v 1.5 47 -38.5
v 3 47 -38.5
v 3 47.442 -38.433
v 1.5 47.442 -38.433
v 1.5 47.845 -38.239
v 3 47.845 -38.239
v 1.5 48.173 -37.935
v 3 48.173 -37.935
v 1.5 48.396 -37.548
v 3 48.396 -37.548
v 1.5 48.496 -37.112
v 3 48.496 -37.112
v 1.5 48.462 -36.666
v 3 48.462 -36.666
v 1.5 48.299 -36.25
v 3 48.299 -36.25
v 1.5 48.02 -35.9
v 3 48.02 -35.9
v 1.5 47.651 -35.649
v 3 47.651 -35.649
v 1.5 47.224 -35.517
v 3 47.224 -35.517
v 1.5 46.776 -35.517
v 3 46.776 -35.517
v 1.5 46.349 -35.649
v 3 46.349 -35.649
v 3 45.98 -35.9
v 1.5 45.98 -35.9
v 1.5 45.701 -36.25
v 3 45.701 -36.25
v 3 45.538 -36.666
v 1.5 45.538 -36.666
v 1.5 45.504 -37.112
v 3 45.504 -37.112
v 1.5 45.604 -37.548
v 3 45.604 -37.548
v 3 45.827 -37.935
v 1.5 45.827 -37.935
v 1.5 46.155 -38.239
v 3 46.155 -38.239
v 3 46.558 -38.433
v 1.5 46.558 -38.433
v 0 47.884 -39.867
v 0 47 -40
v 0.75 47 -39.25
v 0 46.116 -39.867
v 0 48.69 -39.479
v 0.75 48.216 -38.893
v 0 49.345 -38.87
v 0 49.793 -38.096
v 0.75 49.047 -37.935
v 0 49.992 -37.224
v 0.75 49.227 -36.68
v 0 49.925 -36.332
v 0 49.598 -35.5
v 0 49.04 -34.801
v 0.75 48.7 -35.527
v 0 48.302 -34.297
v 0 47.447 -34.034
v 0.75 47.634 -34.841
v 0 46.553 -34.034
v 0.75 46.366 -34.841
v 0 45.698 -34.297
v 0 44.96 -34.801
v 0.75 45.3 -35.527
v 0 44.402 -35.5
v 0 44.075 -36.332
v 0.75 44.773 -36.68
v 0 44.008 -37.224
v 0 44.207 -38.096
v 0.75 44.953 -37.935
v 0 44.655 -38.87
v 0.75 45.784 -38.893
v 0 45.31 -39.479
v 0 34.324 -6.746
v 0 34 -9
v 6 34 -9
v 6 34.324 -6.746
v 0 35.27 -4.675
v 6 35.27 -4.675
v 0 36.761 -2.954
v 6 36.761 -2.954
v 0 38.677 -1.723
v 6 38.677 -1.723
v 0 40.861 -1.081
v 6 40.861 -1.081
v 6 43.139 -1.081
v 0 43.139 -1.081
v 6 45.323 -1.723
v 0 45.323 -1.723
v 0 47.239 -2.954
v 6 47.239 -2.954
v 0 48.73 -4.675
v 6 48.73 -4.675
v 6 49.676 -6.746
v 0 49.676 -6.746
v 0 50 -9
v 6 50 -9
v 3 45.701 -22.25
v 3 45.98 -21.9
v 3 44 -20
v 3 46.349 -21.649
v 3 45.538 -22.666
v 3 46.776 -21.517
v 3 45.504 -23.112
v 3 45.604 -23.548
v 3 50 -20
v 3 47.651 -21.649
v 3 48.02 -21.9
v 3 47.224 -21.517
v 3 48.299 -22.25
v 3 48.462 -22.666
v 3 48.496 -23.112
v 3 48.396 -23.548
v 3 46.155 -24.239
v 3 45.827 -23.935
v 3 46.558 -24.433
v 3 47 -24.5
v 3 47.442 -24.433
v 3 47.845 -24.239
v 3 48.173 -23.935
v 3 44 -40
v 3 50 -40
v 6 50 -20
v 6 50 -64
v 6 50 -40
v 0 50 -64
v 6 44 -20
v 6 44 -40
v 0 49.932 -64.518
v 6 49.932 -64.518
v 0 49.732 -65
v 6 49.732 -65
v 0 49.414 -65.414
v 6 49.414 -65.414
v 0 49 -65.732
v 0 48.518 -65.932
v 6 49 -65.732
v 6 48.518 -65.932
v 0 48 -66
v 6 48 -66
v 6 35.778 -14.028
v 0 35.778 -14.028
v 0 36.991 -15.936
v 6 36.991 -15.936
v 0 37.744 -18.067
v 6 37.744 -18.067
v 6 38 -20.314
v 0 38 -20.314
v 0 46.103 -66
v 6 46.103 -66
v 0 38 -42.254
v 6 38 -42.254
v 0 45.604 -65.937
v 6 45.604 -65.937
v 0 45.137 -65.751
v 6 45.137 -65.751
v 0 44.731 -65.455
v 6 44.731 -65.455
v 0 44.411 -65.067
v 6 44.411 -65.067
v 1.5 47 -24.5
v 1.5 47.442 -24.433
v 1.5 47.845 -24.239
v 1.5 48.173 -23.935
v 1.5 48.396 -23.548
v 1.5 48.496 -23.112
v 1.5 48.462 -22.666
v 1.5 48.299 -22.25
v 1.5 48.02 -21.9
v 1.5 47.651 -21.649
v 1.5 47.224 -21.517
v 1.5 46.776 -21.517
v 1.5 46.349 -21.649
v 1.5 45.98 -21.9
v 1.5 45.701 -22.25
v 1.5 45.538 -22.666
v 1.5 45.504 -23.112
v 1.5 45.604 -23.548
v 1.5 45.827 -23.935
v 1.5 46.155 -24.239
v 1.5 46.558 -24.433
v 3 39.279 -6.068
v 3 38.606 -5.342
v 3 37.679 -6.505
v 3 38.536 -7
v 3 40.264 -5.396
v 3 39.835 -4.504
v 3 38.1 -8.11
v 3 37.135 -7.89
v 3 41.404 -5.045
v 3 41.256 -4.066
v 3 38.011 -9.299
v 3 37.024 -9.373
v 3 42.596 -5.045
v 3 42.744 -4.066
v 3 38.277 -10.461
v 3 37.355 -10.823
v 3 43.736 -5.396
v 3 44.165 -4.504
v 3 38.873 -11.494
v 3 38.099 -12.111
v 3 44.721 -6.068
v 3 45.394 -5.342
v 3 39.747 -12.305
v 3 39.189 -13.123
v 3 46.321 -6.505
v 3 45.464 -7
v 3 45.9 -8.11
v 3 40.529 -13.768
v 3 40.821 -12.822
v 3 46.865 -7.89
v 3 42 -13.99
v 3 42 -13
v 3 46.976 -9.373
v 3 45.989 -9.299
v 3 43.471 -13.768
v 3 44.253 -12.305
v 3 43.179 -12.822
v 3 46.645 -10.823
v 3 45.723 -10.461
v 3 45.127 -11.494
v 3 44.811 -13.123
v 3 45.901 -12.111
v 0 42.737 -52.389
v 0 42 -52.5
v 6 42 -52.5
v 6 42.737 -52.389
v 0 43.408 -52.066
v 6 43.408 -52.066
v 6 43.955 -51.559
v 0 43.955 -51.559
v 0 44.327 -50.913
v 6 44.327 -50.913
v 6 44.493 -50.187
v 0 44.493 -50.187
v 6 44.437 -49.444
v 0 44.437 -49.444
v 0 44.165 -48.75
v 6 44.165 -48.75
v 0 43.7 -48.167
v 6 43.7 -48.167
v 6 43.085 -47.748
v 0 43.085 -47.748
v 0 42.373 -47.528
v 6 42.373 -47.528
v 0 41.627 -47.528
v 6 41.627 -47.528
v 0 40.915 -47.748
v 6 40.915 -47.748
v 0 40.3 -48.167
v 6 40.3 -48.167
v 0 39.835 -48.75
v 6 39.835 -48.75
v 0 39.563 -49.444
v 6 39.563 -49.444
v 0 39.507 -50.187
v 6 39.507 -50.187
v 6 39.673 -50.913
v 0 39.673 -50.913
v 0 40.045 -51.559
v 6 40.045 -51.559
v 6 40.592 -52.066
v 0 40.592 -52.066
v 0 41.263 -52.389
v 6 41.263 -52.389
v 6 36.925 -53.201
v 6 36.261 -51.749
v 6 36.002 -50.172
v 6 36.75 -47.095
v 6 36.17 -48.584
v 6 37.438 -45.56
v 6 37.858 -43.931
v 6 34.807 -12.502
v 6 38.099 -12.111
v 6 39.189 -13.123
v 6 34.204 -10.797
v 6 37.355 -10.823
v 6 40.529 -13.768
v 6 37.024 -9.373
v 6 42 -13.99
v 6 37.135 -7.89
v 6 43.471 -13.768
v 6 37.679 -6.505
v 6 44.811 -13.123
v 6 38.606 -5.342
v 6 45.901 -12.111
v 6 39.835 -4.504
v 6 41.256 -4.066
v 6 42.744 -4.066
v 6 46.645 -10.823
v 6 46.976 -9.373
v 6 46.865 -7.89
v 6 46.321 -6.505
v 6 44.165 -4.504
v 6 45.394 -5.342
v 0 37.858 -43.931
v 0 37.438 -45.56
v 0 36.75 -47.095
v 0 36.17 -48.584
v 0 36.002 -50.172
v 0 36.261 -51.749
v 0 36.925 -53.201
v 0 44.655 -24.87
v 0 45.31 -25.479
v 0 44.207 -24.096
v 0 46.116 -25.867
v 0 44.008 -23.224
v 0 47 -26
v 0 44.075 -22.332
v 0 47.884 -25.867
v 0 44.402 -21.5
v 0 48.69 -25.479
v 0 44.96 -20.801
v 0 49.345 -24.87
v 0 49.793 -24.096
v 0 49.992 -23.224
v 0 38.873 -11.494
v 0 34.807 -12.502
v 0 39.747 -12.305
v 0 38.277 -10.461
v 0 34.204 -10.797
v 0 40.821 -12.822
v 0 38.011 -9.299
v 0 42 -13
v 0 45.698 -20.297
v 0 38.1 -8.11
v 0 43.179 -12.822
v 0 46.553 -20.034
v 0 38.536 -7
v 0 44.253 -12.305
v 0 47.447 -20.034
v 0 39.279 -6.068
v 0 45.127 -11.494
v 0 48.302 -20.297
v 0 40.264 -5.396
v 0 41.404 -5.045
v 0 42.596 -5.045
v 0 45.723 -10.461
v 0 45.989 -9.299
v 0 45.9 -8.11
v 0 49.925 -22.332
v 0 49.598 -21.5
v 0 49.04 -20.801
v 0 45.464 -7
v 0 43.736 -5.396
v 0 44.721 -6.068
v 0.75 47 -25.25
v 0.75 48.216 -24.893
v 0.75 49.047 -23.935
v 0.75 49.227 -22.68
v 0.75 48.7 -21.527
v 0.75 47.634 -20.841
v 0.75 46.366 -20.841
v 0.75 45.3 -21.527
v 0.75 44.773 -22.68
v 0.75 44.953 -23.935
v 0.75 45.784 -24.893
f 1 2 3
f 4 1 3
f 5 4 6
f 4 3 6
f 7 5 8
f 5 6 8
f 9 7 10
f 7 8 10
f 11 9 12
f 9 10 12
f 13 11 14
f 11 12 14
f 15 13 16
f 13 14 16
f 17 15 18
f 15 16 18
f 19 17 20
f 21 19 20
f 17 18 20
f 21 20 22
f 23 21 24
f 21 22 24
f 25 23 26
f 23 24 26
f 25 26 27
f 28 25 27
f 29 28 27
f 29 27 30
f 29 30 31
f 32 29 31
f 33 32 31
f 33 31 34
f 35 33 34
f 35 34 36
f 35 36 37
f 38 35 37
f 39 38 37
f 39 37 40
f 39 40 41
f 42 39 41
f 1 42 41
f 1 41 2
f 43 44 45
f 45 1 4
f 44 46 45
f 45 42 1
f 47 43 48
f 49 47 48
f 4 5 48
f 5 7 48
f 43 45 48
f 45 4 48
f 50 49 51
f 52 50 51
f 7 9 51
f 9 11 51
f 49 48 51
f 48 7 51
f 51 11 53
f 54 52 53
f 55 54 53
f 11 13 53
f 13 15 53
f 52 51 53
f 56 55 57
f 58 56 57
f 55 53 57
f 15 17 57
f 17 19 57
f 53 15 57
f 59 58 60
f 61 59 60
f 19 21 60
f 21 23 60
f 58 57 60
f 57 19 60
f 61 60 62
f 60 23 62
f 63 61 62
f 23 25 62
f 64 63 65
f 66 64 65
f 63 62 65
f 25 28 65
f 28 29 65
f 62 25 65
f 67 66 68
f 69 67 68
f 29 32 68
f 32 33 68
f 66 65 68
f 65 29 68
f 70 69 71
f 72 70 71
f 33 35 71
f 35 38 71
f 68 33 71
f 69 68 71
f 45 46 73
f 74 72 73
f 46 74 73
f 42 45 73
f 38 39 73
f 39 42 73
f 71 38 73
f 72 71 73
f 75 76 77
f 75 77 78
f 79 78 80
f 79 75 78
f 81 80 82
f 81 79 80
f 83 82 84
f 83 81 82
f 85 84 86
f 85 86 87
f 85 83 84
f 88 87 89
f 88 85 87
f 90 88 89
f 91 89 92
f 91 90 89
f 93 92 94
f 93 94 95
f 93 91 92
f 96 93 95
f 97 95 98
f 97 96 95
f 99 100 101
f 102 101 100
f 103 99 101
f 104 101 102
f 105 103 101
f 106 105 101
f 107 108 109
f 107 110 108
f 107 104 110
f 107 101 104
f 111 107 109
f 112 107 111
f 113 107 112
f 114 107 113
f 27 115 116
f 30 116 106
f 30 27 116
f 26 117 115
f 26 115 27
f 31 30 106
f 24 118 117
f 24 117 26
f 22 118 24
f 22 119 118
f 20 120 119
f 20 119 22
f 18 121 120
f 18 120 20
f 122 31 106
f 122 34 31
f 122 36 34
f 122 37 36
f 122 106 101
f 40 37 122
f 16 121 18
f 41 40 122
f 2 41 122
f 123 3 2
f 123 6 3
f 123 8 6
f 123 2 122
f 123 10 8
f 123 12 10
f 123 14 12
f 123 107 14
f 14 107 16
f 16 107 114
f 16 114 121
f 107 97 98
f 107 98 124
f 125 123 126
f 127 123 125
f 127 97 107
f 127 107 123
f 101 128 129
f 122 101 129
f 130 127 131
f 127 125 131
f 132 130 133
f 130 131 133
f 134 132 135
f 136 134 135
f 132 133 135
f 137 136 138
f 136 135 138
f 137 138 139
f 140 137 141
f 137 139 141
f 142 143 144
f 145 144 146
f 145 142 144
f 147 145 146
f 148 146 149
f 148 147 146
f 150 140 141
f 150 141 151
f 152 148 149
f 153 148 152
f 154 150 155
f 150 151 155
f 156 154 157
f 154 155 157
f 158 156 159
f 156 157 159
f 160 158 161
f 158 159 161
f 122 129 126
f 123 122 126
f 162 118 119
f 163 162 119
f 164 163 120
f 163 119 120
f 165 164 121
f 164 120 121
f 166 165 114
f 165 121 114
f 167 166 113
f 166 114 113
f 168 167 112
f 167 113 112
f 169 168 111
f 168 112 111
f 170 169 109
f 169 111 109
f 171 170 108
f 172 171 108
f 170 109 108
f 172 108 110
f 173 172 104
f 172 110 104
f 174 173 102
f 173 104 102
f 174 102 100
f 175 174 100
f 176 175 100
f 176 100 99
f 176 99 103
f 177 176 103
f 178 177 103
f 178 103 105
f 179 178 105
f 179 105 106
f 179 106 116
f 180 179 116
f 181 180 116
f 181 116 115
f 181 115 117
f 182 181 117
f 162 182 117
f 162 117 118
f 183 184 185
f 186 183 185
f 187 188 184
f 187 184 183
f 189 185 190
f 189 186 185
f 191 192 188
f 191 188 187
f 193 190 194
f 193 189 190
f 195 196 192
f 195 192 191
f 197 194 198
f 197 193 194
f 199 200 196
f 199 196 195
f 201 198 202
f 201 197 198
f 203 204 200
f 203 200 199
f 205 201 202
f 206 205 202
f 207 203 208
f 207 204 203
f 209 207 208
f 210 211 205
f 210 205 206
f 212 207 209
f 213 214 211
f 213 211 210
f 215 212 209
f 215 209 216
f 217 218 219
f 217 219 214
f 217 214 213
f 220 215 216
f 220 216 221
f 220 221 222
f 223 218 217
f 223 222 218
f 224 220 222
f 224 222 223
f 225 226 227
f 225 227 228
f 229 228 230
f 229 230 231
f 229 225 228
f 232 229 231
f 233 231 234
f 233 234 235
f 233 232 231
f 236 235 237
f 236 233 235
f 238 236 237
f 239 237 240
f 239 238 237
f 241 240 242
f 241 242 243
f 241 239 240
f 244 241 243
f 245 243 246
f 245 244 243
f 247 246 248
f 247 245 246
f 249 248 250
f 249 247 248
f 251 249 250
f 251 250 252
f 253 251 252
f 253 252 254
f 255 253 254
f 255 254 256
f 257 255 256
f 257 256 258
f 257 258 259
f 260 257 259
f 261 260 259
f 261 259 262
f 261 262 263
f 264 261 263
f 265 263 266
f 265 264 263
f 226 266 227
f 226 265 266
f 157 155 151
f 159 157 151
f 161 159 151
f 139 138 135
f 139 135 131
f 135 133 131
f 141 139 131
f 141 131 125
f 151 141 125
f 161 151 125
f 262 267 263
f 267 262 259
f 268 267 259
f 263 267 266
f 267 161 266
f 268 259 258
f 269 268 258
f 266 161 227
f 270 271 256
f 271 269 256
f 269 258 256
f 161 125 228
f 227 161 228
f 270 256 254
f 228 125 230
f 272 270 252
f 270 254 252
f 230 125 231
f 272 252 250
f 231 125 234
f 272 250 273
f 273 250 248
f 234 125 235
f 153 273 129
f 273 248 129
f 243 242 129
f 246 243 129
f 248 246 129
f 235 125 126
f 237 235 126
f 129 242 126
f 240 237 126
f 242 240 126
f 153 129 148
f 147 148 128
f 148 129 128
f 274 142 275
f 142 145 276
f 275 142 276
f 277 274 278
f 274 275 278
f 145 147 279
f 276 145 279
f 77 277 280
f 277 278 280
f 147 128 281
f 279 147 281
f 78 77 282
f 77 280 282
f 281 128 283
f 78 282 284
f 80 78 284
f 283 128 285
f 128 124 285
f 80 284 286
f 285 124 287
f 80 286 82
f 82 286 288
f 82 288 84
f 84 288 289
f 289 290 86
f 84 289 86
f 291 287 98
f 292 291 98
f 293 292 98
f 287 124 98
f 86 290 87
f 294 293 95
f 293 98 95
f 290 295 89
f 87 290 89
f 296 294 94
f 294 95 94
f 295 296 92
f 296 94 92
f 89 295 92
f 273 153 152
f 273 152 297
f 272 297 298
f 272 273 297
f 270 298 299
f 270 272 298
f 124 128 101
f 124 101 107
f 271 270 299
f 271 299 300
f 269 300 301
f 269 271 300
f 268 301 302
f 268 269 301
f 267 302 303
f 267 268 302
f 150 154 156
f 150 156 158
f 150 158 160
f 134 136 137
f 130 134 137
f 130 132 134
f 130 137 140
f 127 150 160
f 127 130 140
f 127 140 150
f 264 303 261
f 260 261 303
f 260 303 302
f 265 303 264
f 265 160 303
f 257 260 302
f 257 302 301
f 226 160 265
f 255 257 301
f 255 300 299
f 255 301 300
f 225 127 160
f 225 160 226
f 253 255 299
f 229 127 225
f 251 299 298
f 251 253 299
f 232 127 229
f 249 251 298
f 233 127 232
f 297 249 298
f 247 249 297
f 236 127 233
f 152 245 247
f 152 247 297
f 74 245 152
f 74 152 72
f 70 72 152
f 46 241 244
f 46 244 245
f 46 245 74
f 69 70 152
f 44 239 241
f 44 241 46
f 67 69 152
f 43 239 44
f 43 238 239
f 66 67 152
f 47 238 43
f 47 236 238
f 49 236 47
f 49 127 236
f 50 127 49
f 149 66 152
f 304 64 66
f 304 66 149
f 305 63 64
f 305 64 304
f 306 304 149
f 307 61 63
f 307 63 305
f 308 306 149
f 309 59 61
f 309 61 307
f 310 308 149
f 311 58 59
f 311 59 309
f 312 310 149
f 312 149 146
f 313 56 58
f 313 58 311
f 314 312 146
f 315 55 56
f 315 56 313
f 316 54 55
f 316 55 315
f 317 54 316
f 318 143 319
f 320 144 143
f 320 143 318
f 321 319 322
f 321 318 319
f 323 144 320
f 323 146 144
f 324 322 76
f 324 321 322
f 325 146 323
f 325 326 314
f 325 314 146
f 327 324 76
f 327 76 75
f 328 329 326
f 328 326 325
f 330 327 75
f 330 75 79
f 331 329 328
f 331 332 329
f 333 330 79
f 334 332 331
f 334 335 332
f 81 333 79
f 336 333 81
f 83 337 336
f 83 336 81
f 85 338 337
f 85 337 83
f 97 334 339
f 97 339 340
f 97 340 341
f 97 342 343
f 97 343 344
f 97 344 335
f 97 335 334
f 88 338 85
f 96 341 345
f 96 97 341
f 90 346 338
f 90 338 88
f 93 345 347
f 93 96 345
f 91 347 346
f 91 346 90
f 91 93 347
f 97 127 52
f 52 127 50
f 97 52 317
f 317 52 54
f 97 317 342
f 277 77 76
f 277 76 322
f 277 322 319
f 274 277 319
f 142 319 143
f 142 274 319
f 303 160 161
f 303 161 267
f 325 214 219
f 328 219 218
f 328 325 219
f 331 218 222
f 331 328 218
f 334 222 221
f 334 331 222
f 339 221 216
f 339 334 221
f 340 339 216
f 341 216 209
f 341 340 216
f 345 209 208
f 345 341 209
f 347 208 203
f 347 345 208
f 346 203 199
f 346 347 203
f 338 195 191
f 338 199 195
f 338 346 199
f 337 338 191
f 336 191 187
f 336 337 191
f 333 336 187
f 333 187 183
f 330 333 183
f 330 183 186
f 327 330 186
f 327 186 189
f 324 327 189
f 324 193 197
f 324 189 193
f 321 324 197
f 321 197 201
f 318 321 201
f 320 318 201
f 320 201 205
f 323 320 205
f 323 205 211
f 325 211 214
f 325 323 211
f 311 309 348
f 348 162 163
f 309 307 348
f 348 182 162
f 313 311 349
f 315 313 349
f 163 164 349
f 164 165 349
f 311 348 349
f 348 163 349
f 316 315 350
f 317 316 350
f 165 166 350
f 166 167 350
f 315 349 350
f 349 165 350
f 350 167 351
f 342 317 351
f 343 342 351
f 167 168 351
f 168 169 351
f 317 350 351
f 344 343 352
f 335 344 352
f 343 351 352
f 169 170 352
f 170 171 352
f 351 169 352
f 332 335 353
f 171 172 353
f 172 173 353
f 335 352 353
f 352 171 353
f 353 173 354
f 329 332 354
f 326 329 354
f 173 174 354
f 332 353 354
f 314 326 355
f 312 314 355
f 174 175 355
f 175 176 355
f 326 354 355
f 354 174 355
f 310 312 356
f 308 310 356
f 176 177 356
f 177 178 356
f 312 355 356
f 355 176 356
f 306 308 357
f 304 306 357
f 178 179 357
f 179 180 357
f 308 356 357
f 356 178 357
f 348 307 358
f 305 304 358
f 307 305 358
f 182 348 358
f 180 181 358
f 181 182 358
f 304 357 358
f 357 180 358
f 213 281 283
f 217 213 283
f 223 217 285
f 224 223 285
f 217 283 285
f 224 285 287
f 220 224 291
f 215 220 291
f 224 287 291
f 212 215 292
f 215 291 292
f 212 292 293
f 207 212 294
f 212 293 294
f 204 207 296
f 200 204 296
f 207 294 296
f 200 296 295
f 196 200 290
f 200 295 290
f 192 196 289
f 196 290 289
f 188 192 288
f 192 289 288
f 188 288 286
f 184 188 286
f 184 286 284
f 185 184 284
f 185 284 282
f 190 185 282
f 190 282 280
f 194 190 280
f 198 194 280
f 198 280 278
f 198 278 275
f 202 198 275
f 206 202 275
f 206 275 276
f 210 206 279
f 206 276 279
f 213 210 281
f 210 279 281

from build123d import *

# Parameters (mm, degrees)
SKETCH27_R          = 4
SKETCH27_R_2        = 2.5
BOSS_EXTRUDE1_DEPTH = 6
SKETCH33_R          = 4.99
CUT_EXTRUDE2_DEPTH  = 3
SKETCH34_W          = 20
SKETCH34_H          = 6
CUT_EXTRUDE3_DEPTH  = 3
CUT_EXTRUDE5_REACH  = 84.855
SKETCH36_R          = 1.5
FILLET3_R           = 2
FILLET4_R           = 10
CUT_EXTRUDE6_REACH  = 85.018
CHAMFER1_SIZE       = 1.5


with BuildPart() as part:
    # Sketch27 → Boss-Extrude1 (new body)
    with BuildSketch(Plane(origin=(0, 0, 0), x_dir=(0, 0, -1), z_dir=(1, 0, 0))):
        with BuildLine():
            Line((9, 50), (66, 50))
            Line((66, 50), (66, 45))
            Line((66, 45), (48.564398788, 34))
            Line((48.564398788, 34), (9, 34))
            ThreePointArc((9, 34), (1, 42), (9, 50))
        make_face()
        with Locations((9, 42)):
            Circle(SKETCH27_R, mode=Mode.SUBTRACT)
        with Locations((50, 42)):
            Circle(SKETCH27_R_2, mode=Mode.SUBTRACT)
    extrude(amount=BOSS_EXTRUDE1_DEPTH)

    # Sketch33 → Cut-Extrude2 (cut)
    with BuildSketch(Plane(origin=(6, 0, 0), x_dir=(0, 0, -1), z_dir=(1, 0, 0))):
        with Locations((9, 42)):
            Circle(SKETCH33_R)
    extrude(amount=-CUT_EXTRUDE2_DEPTH, mode=Mode.SUBTRACT)

    # Sketch34 → Cut-Extrude3 (cut)
    with BuildSketch(Plane(origin=(6, 0, 0), x_dir=(0, 0, -1), z_dir=(1, 0, 0))):
        with Locations((30, 47)):
            Rectangle(SKETCH34_W, SKETCH34_H)
    extrude(amount=-CUT_EXTRUDE3_DEPTH, mode=Mode.SUBTRACT)

    # Sketch36 → Cut-Extrude5 (cut, up to next)
    with BuildSketch(Plane(origin=(3, 0, 0), x_dir=(0, 0, -1), z_dir=(1, 0, 0)), mode=Mode.PRIVATE) as cut_extrude5_sk1:
        with Locations((23, 47)):
            Circle(SKETCH36_R)
    cut_extrude5_tool1 = extrude(cut_extrude5_sk1.sketch, amount=-CUT_EXTRUDE5_REACH, mode=Mode.PRIVATE) & part.part
    # Sketch36 → Cut-Extrude5 (cut, up to next)
    with BuildSketch(Plane(origin=(3, 0, 0), x_dir=(0, 0, -1), z_dir=(1, 0, 0)), mode=Mode.PRIVATE) as cut_extrude5_sk2:
        with Locations((37, 47)):
            Circle(SKETCH36_R)
    cut_extrude5_tool2 = extrude(cut_extrude5_sk2.sketch, amount=-CUT_EXTRUDE5_REACH, mode=Mode.PRIVATE) & part.part
    add(cut_extrude5_tool1.solids().sort_by_distance((3, 47, -23))[0], mode=Mode.SUBTRACT)
    add(cut_extrude5_tool2.solids().sort_by_distance((3, 47, -37))[0], mode=Mode.SUBTRACT)

    # Fillet3
    fillet3_edges = [part.edges().sort_by_distance(p)[0] for p in [
        (3, 50, -66),
        (3, 45, -66),
    ]]
    fillet(fillet3_edges, radius=FILLET3_R)

    # Fillet4
    fillet4_edges = [part.edges().sort_by_distance(p)[0] for p in [
        (3, 34, -48.564398788),
    ]]
    fillet(fillet4_edges, radius=FILLET4_R)

    # Sketch37 → Cut-Extrude6 (cut, up to next)
    with BuildSketch(Plane(origin=(6, 0, 0), x_dir=(0, 0, -1), z_dir=(1, 0, 0)), mode=Mode.PRIVATE) as cut_extrude6_sk1:
        with BuildLine():
            Line((20.313708499, 38), (42.254033308, 38))
            ThreePointArc((42.254033308, 38), (44.754033308, 37.682458366), (47.09526249, 36.75))
            ThreePointArc((47.09526249, 36.75), (50.17237218, 36.002476525), (53.201469536, 36.925495807))
            Line((53.201469536, 36.925495807), (53.201469536, 34))
            Line((53.201469536, 34), (9, 34))
            ThreePointArc((9, 34), (11.666666667, 34.457527667), (14.028314888, 35.777777778))
            ThreePointArc((14.028314888, 35.777777778), (16.980375166, 37.428090416), (20.313708499, 38))
        make_face()
    cut_extrude6_tool1 = extrude(cut_extrude6_sk1.sketch, amount=-CUT_EXTRUDE6_REACH, mode=Mode.PRIVATE) & part.part
    add(cut_extrude6_tool1.solids().sort_by_distance((6, 35.823598, -32.372789))[0], mode=Mode.SUBTRACT)

    # Chamfer1
    chamfer1_edges = [part.edges().sort_by_distance(p)[0] for p in [
        (0, 47, -21.5),
        (0, 47, -35.5),
    ]]
    chamfer(chamfer1_edges, length=CHAMFER1_SIZE - 0.0001)  # a hair under: the kernel refuses the full size


solid = part.part
